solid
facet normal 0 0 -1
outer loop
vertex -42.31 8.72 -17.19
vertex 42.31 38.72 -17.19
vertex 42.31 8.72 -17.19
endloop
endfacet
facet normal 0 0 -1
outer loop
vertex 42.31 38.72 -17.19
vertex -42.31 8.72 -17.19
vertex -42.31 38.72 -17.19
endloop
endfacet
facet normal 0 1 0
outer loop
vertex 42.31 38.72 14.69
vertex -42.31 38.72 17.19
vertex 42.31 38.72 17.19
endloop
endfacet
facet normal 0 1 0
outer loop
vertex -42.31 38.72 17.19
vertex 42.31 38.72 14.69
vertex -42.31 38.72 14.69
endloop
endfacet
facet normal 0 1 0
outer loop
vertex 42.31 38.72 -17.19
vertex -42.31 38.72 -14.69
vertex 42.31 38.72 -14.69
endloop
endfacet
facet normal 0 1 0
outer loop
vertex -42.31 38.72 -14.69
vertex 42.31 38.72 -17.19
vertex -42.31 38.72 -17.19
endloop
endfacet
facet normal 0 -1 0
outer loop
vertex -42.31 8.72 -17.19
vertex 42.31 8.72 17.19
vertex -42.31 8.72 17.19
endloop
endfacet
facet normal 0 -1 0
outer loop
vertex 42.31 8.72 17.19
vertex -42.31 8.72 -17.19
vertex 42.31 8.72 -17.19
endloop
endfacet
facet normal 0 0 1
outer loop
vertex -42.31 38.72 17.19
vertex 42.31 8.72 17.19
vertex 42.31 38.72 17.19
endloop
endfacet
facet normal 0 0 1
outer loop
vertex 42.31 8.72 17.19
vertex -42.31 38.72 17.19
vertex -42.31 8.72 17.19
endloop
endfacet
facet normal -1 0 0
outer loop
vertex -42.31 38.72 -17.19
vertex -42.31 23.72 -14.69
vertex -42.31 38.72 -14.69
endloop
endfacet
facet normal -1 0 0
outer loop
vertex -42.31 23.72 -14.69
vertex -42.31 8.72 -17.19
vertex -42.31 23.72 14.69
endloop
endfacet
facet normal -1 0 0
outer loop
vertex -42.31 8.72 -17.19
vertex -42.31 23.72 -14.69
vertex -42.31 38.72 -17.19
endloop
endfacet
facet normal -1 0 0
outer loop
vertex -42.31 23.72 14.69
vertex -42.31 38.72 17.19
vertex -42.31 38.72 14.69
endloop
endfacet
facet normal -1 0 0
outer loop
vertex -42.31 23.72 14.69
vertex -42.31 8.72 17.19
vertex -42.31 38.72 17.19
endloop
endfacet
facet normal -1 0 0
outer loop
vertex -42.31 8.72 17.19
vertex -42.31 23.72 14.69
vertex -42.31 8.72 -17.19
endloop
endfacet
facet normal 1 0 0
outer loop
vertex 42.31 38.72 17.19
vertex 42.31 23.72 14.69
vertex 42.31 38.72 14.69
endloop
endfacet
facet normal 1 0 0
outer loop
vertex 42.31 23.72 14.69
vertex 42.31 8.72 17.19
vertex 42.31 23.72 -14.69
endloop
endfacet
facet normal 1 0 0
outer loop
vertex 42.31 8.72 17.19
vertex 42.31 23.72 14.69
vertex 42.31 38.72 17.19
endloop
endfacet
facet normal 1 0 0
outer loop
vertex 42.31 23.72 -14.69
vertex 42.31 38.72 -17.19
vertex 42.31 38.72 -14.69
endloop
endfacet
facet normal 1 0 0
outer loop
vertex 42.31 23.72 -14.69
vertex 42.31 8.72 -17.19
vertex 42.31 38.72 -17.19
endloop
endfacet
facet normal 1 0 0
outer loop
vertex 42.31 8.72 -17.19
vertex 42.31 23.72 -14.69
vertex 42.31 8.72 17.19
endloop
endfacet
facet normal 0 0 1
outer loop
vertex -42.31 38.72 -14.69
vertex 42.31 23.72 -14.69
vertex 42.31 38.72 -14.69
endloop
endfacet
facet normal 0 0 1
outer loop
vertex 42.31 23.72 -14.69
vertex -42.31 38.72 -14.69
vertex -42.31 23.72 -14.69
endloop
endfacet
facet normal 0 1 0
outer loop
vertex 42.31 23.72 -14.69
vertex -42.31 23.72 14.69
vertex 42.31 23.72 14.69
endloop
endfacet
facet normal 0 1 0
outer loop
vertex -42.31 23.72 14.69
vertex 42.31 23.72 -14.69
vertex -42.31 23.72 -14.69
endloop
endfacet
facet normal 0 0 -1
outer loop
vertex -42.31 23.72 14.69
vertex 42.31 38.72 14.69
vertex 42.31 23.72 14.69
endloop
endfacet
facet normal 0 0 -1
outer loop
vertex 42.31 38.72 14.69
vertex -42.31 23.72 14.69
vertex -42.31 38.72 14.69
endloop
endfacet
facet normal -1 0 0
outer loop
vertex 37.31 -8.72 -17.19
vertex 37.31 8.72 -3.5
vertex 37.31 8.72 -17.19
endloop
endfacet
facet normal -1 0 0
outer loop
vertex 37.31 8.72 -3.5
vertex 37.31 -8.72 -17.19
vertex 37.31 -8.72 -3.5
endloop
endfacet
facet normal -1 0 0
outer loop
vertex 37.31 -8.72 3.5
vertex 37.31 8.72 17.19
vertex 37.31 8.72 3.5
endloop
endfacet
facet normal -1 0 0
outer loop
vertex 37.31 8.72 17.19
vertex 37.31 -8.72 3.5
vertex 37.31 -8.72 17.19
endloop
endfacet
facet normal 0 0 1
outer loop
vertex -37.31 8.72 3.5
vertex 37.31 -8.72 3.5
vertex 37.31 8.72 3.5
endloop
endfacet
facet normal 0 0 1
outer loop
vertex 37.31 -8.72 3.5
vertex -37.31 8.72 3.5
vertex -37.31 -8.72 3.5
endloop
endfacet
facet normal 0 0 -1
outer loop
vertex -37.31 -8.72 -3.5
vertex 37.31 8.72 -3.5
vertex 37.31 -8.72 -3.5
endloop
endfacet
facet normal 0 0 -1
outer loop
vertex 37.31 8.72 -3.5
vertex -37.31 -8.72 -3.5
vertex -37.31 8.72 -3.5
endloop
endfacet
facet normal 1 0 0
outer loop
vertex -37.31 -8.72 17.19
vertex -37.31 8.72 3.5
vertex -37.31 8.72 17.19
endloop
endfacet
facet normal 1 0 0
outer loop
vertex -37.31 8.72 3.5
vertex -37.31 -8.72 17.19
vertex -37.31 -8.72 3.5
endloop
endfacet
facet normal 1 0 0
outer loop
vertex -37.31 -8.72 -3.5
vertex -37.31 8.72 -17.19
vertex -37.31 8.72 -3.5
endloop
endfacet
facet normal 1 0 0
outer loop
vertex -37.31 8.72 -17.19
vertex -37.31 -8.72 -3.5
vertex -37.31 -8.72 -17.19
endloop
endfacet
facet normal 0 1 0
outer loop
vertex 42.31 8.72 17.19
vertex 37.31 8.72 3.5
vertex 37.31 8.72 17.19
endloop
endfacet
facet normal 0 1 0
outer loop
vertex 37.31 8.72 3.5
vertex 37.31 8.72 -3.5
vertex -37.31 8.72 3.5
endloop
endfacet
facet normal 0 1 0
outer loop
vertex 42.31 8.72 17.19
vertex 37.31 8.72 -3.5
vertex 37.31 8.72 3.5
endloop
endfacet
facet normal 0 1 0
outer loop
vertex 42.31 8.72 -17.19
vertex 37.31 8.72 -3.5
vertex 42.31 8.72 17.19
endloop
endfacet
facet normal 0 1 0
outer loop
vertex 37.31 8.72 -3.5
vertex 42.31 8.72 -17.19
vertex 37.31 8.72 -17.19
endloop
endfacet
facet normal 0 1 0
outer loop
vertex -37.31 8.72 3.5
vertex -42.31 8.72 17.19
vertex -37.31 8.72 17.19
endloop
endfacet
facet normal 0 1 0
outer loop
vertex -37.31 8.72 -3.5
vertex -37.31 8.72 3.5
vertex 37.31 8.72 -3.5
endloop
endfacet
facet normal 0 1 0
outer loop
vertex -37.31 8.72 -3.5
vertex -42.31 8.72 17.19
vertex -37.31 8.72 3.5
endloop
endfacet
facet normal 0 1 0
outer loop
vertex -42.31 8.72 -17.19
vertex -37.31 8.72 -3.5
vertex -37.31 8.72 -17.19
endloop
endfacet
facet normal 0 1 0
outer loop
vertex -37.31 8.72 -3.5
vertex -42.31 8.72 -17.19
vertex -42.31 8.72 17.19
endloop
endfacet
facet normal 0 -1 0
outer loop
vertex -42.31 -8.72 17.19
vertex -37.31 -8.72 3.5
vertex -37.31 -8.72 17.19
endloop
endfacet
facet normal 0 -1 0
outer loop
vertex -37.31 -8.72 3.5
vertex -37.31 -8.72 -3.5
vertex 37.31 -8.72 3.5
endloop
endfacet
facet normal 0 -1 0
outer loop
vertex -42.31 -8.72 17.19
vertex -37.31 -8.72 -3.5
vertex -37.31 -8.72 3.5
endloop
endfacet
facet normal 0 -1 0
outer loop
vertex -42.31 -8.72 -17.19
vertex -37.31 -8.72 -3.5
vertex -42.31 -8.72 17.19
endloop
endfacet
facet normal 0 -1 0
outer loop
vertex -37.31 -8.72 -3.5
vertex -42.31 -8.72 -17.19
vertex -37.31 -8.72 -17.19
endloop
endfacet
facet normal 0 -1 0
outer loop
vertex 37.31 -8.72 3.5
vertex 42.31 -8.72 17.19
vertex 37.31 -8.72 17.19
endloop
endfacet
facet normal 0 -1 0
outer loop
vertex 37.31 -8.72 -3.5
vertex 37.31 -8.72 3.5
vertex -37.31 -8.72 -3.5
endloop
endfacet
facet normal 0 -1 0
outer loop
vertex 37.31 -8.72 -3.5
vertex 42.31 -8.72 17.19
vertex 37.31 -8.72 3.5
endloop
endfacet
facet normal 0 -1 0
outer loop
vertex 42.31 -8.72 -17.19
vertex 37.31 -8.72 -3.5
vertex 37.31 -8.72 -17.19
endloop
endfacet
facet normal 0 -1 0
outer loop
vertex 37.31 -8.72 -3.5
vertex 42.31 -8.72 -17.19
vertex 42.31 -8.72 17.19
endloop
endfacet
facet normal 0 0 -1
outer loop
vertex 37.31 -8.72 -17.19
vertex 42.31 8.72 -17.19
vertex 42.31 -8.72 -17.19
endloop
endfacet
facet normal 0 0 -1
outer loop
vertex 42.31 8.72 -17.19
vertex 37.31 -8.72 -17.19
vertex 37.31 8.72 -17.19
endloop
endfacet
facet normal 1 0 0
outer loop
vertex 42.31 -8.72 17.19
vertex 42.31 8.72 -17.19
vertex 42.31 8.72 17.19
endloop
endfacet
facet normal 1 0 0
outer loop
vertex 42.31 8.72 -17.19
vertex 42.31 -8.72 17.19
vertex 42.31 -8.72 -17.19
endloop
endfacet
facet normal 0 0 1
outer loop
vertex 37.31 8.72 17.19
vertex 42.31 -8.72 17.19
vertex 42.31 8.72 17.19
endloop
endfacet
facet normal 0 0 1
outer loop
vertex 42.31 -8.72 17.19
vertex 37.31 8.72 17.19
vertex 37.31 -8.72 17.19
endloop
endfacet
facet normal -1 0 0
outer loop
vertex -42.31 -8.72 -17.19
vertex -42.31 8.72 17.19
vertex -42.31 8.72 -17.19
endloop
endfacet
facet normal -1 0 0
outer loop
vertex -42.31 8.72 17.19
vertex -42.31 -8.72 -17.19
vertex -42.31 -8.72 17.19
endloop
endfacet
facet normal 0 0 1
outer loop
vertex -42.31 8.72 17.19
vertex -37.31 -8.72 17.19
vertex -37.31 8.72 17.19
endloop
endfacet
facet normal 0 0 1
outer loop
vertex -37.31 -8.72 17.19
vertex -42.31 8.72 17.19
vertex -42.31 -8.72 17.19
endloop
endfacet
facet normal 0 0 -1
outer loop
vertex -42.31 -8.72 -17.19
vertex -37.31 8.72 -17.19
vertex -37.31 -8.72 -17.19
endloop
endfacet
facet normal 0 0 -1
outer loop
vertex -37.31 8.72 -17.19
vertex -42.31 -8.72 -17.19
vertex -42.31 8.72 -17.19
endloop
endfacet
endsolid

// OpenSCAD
jaws_length = 74.62; // side that's perpindicular to lead screw
jaws_height = 17.44; // top to bottom measurement

jaw_thickness = 13.69;
clamp_at_width = 7; // expected size at which this gets clamped at

wings_length = 2 * jaw_thickness + clamp_at_width; // how far out the sides reach
wings_width = 5;

top_width = 30;

module wing() {
    rotate([0, 90, 0]) {
        translate([-wings_length/2, -jaws_height/2, jaws_length/2]) {
            cube([wings_length, jaws_height, wings_width]);
        }
    }
}

module open_box(x, y, z, a) {
    difference() {
        cube([x, y, z], center=true);
        translate([0, 0, z/2]) {
            cube([x-a, y+1, z], center=true);
        }
    }
}

union() {
    // The bar that gets clamped
    cube([jaws_length, jaws_height, clamp_at_width], center=true);
    // Side wings to prevent it from sliding off perpindicular to jaws
    wing();
    mirror([1,0,0]) {
        wing();
    }
    // top
    translate([0, jaws_height/2 + top_width/2, 0])
    rotate([0, 90, 90]) {
        // cube([wings_length, jaws_length + (wings_width * 2), top_width], center=true);
        open_box(wings_length, jaws_length + (wings_width * 2), top_width, 5);
    }
}
